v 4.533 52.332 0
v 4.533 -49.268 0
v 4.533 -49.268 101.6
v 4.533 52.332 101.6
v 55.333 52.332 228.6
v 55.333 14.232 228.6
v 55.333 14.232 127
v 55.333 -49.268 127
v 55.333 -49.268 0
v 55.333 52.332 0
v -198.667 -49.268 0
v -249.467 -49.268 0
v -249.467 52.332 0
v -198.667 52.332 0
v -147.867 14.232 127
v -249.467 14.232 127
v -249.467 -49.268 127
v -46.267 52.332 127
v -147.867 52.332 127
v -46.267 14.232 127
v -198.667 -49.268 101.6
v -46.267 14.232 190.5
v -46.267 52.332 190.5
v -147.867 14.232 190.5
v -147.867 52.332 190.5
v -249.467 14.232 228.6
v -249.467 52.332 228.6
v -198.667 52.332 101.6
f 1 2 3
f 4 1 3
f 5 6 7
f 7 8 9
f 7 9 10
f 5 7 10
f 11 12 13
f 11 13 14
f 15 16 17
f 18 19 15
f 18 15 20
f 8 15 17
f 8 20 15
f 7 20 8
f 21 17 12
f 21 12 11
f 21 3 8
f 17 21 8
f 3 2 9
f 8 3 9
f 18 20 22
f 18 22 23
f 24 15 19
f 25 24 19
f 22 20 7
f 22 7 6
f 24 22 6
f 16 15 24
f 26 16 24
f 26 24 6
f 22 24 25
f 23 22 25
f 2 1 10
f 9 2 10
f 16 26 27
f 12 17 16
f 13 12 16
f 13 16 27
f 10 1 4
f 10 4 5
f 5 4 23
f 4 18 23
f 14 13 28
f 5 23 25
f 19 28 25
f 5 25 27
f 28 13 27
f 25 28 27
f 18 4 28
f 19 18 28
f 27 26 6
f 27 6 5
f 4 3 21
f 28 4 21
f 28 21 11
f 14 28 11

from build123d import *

# Parameters (mm, degrees)
F0_W     = 304.8
F0_H     = 101.6
F1_DEPTH = 127
F3_DEPTH = 101.601
F4_W     = 50.8
F4_H     = 38.1
F5_DEPTH = 101.6
F6_W     = 38.1
F6_H     = 38.1
F7_DEPTH = 101.6


with BuildPart() as f1:
    # F0 (on Top) → F1 (new body)
    with BuildSketch(Plane.XY):
        with Locations((-97.066794, 1.532109)):
            Rectangle(F0_W, F0_H)
    extrude(amount=F1_DEPTH)

    # F2 (on face) → F3 (cut, through all)
    with BuildSketch(Plane.XZ.offset(49.267891)):
        Polygon((-198.666794, 63.5), (-198.666794, 0), (4.533206, 0), (4.533206, 63.5), (4.533206, 101.6), (-198.666794, 101.6), align=None)
    extrude(amount=-F3_DEPTH, mode=Mode.SUBTRACT)

    # F4 (on face) → F5 (join)
    with BuildSketch(Plane.XY.offset(127)):
        with Locations((-224.066794, 33.282109)):
            Rectangle(F4_W, F4_H)
        with Locations((-173.266794, 33.282109)):
            Rectangle(F4_W, F4_H)
        with Locations((-20.866794, 33.282109)):
            Rectangle(F4_W, F4_H)
        with Locations((29.933206, 33.282109)):
            Rectangle(F4_W, F4_H)
    extrude(amount=F5_DEPTH)

    # F6 (on face) → F7 (join)
    with BuildSketch(Plane.YZ.offset(-147.866794)):
        with Locations((33.282109, 209.55)):
            Rectangle(F6_W, F6_H)
    extrude(amount=F7_DEPTH)


solid = f1.part
